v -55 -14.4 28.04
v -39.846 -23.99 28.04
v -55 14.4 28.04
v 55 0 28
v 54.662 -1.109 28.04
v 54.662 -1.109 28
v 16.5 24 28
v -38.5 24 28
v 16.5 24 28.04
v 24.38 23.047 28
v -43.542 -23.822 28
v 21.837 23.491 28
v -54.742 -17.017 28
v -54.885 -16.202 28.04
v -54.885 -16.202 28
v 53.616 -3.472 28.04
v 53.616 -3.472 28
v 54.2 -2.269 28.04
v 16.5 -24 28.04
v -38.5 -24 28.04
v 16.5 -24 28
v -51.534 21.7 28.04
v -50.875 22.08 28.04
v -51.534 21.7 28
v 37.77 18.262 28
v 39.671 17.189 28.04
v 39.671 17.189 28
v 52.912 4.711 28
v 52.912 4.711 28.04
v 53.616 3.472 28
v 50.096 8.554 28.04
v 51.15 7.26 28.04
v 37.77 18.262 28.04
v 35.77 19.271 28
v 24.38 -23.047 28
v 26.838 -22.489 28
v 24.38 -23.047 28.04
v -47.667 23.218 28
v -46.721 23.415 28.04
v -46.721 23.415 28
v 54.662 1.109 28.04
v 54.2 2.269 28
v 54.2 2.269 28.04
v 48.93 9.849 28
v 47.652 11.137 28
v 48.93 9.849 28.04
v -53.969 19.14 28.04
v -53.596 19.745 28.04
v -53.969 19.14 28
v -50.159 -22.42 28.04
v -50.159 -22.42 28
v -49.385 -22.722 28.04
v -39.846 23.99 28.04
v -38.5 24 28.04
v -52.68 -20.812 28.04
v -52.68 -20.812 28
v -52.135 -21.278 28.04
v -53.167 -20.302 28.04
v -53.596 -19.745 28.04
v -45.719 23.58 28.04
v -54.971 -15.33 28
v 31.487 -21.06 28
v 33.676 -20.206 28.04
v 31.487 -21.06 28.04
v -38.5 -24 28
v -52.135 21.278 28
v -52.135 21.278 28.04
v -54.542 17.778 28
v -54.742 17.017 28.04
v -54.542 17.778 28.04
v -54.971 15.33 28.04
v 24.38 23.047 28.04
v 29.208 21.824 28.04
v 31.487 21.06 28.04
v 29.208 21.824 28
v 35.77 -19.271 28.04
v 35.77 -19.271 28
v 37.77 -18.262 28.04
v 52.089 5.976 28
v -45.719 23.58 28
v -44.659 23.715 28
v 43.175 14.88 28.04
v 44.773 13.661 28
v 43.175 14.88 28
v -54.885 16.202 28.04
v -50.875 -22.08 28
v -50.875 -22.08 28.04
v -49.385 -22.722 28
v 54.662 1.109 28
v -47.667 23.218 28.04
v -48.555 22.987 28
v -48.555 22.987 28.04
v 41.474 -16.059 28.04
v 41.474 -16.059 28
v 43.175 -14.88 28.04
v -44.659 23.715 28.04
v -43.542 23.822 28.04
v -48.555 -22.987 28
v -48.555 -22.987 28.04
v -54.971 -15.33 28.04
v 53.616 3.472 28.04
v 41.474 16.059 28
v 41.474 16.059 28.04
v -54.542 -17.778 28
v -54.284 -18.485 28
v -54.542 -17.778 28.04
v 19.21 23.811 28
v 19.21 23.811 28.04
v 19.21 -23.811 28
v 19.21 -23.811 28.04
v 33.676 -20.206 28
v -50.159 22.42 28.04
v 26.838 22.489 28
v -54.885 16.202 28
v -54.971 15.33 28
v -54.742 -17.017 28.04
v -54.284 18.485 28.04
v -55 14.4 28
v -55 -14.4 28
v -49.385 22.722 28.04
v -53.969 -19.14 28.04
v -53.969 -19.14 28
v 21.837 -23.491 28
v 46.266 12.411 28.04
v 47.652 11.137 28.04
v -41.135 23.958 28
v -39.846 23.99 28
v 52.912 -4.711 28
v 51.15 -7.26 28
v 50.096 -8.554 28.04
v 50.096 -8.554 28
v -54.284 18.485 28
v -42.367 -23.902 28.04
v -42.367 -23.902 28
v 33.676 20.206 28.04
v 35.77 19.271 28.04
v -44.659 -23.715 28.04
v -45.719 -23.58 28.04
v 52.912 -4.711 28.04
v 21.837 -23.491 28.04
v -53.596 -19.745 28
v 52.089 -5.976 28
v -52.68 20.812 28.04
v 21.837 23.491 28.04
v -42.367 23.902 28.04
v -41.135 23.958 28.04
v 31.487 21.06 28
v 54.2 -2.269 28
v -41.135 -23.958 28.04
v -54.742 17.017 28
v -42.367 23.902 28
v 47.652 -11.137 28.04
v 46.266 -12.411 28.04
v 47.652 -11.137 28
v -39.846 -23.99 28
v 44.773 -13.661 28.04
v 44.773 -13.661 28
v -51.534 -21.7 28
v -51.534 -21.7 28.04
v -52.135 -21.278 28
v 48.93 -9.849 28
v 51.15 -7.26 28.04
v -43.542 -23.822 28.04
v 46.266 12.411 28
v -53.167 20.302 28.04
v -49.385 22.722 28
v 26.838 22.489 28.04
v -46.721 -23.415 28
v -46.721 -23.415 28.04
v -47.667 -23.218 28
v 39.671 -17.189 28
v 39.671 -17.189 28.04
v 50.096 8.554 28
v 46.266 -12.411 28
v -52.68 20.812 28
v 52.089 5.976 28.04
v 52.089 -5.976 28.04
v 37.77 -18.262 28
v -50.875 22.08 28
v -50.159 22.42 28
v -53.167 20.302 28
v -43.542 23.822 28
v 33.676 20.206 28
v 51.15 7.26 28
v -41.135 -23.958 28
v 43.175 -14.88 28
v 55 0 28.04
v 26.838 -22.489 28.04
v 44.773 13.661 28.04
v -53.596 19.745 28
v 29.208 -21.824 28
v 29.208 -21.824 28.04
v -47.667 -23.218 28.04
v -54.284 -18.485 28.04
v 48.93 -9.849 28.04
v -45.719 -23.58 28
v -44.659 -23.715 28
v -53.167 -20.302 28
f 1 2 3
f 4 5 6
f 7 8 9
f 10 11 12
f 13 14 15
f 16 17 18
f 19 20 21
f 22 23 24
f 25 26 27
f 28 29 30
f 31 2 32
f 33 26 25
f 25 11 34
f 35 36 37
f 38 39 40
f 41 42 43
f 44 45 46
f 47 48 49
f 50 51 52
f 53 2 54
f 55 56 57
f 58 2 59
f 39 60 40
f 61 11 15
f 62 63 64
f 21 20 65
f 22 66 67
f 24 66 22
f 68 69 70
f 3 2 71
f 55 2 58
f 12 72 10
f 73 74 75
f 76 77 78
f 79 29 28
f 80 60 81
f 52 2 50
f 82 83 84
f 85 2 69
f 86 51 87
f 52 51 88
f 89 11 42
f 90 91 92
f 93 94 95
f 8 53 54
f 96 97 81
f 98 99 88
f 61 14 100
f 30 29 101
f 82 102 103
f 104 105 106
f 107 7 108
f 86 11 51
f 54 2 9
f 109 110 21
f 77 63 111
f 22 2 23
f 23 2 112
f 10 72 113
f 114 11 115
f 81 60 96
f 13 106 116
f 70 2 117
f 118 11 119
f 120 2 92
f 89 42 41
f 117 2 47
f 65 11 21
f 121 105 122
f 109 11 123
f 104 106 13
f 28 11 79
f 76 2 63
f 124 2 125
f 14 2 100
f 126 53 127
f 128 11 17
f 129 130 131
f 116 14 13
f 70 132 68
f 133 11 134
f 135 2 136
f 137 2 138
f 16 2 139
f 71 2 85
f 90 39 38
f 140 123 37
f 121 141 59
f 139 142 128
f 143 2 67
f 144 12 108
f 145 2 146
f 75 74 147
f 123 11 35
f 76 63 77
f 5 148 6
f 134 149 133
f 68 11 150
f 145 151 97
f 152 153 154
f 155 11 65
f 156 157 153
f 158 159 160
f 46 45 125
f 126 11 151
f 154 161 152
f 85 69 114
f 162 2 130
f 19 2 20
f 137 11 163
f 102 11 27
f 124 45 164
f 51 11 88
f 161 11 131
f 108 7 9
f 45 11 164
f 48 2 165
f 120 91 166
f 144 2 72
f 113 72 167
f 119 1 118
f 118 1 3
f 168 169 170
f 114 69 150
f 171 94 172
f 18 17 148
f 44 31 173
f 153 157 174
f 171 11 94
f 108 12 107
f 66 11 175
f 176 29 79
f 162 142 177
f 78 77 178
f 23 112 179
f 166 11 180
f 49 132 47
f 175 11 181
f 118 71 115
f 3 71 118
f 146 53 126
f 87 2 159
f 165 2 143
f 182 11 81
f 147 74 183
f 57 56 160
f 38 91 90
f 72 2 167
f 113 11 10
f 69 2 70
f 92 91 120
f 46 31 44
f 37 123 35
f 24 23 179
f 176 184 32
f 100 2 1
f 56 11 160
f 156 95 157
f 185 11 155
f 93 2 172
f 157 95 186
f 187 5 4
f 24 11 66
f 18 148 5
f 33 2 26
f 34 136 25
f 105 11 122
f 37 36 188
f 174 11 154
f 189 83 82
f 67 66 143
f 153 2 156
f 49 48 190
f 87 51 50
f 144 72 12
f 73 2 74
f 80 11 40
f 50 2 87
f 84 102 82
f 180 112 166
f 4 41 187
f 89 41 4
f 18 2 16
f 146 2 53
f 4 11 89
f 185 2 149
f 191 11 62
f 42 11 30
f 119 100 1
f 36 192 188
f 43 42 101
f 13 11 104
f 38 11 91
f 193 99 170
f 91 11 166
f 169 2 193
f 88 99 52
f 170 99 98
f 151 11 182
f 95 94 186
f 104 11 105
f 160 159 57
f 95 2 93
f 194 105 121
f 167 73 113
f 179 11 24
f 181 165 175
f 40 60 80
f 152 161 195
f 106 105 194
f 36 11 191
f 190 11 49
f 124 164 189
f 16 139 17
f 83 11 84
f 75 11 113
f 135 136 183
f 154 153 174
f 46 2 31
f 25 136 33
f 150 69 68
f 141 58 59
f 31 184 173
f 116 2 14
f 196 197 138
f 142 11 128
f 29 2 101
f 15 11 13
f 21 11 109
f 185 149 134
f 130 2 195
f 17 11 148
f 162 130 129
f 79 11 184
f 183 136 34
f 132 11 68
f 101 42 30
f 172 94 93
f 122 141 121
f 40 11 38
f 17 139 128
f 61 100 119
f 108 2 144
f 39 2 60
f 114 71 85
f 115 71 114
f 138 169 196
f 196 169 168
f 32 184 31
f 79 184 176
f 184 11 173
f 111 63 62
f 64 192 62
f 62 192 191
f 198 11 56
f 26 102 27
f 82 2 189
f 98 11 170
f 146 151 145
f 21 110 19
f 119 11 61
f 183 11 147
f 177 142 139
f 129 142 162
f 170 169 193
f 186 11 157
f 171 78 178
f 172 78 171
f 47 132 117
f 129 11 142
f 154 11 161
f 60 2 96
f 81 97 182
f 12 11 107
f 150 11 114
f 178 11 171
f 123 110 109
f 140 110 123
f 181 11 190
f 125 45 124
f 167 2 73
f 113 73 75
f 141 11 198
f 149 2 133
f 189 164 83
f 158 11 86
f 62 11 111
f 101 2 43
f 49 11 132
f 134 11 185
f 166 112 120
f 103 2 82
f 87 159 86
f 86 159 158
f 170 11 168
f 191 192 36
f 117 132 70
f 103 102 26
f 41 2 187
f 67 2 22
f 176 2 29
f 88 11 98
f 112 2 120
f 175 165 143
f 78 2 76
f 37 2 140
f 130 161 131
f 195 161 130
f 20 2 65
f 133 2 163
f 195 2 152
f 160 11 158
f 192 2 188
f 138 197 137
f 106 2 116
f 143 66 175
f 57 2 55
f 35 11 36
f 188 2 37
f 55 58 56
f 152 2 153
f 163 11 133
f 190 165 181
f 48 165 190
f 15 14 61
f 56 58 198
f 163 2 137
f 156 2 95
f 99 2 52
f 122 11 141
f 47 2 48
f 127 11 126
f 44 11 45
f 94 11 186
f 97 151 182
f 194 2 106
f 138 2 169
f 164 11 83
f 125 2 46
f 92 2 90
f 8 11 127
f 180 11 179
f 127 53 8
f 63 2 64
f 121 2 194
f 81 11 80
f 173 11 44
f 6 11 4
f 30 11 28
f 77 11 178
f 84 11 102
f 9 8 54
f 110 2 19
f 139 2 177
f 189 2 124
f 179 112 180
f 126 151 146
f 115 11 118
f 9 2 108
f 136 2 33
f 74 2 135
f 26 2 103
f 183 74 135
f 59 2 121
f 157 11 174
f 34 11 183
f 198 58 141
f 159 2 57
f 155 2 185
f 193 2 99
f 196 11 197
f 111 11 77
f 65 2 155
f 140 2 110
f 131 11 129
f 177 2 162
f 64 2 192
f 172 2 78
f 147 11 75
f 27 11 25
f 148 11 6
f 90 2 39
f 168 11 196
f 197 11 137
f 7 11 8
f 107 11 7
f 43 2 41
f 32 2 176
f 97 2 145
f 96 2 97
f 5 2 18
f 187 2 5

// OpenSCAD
hull() {
  translate([0, 0, 28]) {
    linear_extrude(height = 2.0e-2) {
      polygon(points = [[-55, -14.4], [-54.971354167, -15.330277778], [-54.885416667, -16.202222222], [-54.7421875, -17.0175], [-54.541666667, -17.777777778], [-54.283854167, -18.484722222], [-53.96875, -19.14], [-53.596354167, -19.745277778], [-53.166666667, -20.302222222], [-52.6796875, -20.8125], [-52.135416667, -21.277777778], [-51.533854167, -21.699722222], [-50.875, -22.08], [-50.158854167, -22.420277778], [-49.385416667, -22.722222222], [-48.5546875, -22.9875], [-47.666666667, -23.217777778], [-46.721354167, -23.414722222], [-45.71875, -23.58], [-44.658854167, -23.715277778], [-43.541666667, -23.822222222], [-42.3671875, -23.9025], [-41.135416667, -23.957777778], [-39.846354167, -23.989722222], [-38.5, -24], [-36.409649884, -24], [-34.266782407, -24], [-32.076171875, -24], [-29.842592593, -24], [-27.570818866, -24], [-25.265625, -24], [-22.931785301, -24], [-20.574074074, -24], [-18.197265625, -24], [-15.806134259, -24], [-13.405454282, -24], [-11, -24], [-8.594545718, -24], [-6.193865741, -24], [-3.802734375, -24], [-1.425925926, -24], [0.931785301, -24], [3.265625, -24], [5.570818866, -24], [7.842592593, -24], [10.076171875, -24], [12.266782407, -24], [14.409649884, -24], [16.5, -24], [19.209577546, -23.811388889], [21.837037037, -23.491111111], [24.38046875, -23.0475], [26.837962963, -22.488888889], [29.207609954, -21.823611111], [31.4875, -21.06], [33.67572338, -20.206388889], [35.77037037, -19.271111111], [37.76953125, -18.2625], [39.671296296, -17.188888889], [41.473755787, -16.058611111], [43.175, -14.88], [44.773119213, -13.661388889], [46.266203704, -12.411111111], [47.65234375, -11.1375], [48.92962963, -9.848888889], [50.09615162, -8.553611111], [51.15, -7.26], [52.089265046, -5.976388889], [52.912037037, -4.711111111], [53.61640625, -3.4725], [54.200462963, -2.268888889], [54.662297454, -1.108611111], [55, 0], [54.662297454, 1.108611111], [54.200462963, 2.268888889], [53.61640625, 3.4725], [52.912037037, 4.711111111], [52.089265046, 5.976388889], [51.15, 7.26], [50.09615162, 8.553611111], [48.92962963, 9.848888889], [47.65234375, 11.1375], [46.266203704, 12.411111111], [44.773119213, 13.661388889], [43.175, 14.88], [41.473755787, 16.058611111], [39.671296296, 17.188888889], [37.76953125, 18.2625], [35.77037037, 19.271111111], [33.67572338, 20.206388889], [31.4875, 21.06], [29.207609954, 21.823611111], [26.837962963, 22.488888889], [24.38046875, 23.0475], [21.837037037, 23.491111111], [19.209577546, 23.811388889], [16.5, 24], [14.409649884, 24], [12.266782407, 24], [10.076171875, 24], [7.842592593, 24], [5.570818866, 24], [3.265625, 24], [0.931785301, 24], [-1.425925926, 24], [-3.802734375, 24], [-6.193865741, 24], [-8.594545718, 24], [-11, 24], [-13.405454282, 24], [-15.806134259, 24], [-18.197265625, 24], [-20.574074074, 24], [-22.931785301, 24], [-25.265625, 24], [-27.570818866, 24], [-29.842592593, 24], [-32.076171875, 24], [-34.266782407, 24], [-36.409649884, 24], [-38.5, 24], [-39.846354167, 23.989722222], [-41.135416667, 23.957777778], [-42.3671875, 23.9025], [-43.541666667, 23.822222222], [-44.658854167, 23.715277778], [-45.71875, 23.58], [-46.721354167, 23.414722222], [-47.666666667, 23.217777778], [-48.5546875, 22.9875], [-49.385416667, 22.722222222], [-50.158854167, 22.420277778], [-50.875, 22.08], [-51.533854167, 21.699722222], [-52.135416667, 21.277777778], [-52.6796875, 20.8125], [-53.166666667, 20.302222222], [-53.596354167, 19.745277778], [-53.96875, 19.14], [-54.283854167, 18.484722222], [-54.541666667, 17.777777778], [-54.7421875, 17.0175], [-54.885416667, 16.202222222], [-54.971354167, 15.330277778], [-55, 14.4], [-55, 13.2], [-55, 12], [-55, 10.8], [-55, 9.6], [-55, 8.4], [-55, 7.2], [-55, 6], [-55, 4.8], [-55, 3.6], [-55, 2.4], [-55, 1.2], [-55, 0], [-55, -1.2], [-55, -2.4], [-55, -3.6], [-55, -4.8], [-55, -6], [-55, -7.2], [-55, -8.4], [-55, -9.6], [-55, -10.8], [-55, -12], [-55, -13.2], [-55, -14.4]]);
    }
  }
  translate([0, 0, 28.02]) {
    linear_extrude(height = 2.0e-2) {
      polygon(points = [[-55, -14.4], [-54.971354167, -15.330277778], [-54.885416667, -16.202222222], [-54.7421875, -17.0175], [-54.541666667, -17.777777778], [-54.283854167, -18.484722222], [-53.96875, -19.14], [-53.596354167, -19.745277778], [-53.166666667, -20.302222222], [-52.6796875, -20.8125], [-52.135416667, -21.277777778], [-51.533854167, -21.699722222], [-50.875, -22.08], [-50.158854167, -22.420277778], [-49.385416667, -22.722222222], [-48.5546875, -22.9875], [-47.666666667, -23.217777778], [-46.721354167, -23.414722222], [-45.71875, -23.58], [-44.658854167, -23.715277778], [-43.541666667, -23.822222222], [-42.3671875, -23.9025], [-41.135416667, -23.957777778], [-39.846354167, -23.989722222], [-38.5, -24], [-36.409649884, -24], [-34.266782407, -24], [-32.076171875, -24], [-29.842592593, -24], [-27.570818866, -24], [-25.265625, -24], [-22.931785301, -24], [-20.574074074, -24], [-18.197265625, -24], [-15.806134259, -24], [-13.405454282, -24], [-11, -24], [-8.594545718, -24], [-6.193865741, -24], [-3.802734375, -24], [-1.425925926, -24], [0.931785301, -24], [3.265625, -24], [5.570818866, -24], [7.842592593, -24], [10.076171875, -24], [12.266782407, -24], [14.409649884, -24], [16.5, -24], [19.209577546, -23.811388889], [21.837037037, -23.491111111], [24.38046875, -23.0475], [26.837962963, -22.488888889], [29.207609954, -21.823611111], [31.4875, -21.06], [33.67572338, -20.206388889], [35.77037037, -19.271111111], [37.76953125, -18.2625], [39.671296296, -17.188888889], [41.473755787, -16.058611111], [43.175, -14.88], [44.773119213, -13.661388889], [46.266203704, -12.411111111], [47.65234375, -11.1375], [48.92962963, -9.848888889], [50.09615162, -8.553611111], [51.15, -7.26], [52.089265046, -5.976388889], [52.912037037, -4.711111111], [53.61640625, -3.4725], [54.200462963, -2.268888889], [54.662297454, -1.108611111], [55, 0], [54.662297454, 1.108611111], [54.200462963, 2.268888889], [53.61640625, 3.4725], [52.912037037, 4.711111111], [52.089265046, 5.976388889], [51.15, 7.26], [50.09615162, 8.553611111], [48.92962963, 9.848888889], [47.65234375, 11.1375], [46.266203704, 12.411111111], [44.773119213, 13.661388889], [43.175, 14.88], [41.473755787, 16.058611111], [39.671296296, 17.188888889], [37.76953125, 18.2625], [35.77037037, 19.271111111], [33.67572338, 20.206388889], [31.4875, 21.06], [29.207609954, 21.823611111], [26.837962963, 22.488888889], [24.38046875, 23.0475], [21.837037037, 23.491111111], [19.209577546, 23.811388889], [16.5, 24], [14.409649884, 24], [12.266782407, 24], [10.076171875, 24], [7.842592593, 24], [5.570818866, 24], [3.265625, 24], [0.931785301, 24], [-1.425925926, 24], [-3.802734375, 24], [-6.193865741, 24], [-8.594545718, 24], [-11, 24], [-13.405454282, 24], [-15.806134259, 24], [-18.197265625, 24], [-20.574074074, 24], [-22.931785301, 24], [-25.265625, 24], [-27.570818866, 24], [-29.842592593, 24], [-32.076171875, 24], [-34.266782407, 24], [-36.409649884, 24], [-38.5, 24], [-39.846354167, 23.989722222], [-41.135416667, 23.957777778], [-42.3671875, 23.9025], [-43.541666667, 23.822222222], [-44.658854167, 23.715277778], [-45.71875, 23.58], [-46.721354167, 23.414722222], [-47.666666667, 23.217777778], [-48.5546875, 22.9875], [-49.385416667, 22.722222222], [-50.158854167, 22.420277778], [-50.875, 22.08], [-51.533854167, 21.699722222], [-52.135416667, 21.277777778], [-52.6796875, 20.8125], [-53.166666667, 20.302222222], [-53.596354167, 19.745277778], [-53.96875, 19.14], [-54.283854167, 18.484722222], [-54.541666667, 17.777777778], [-54.7421875, 17.0175], [-54.885416667, 16.202222222], [-54.971354167, 15.330277778], [-55, 14.4], [-55, 13.2], [-55, 12], [-55, 10.8], [-55, 9.6], [-55, 8.4], [-55, 7.2], [-55, 6], [-55, 4.8], [-55, 3.6], [-55, 2.4], [-55, 1.2], [-55, 0], [-55, -1.2], [-55, -2.4], [-55, -3.6], [-55, -4.8], [-55, -6], [-55, -7.2], [-55, -8.4], [-55, -9.6], [-55, -10.8], [-55, -12], [-55, -13.2], [-55, -14.4]]);
    }
  }
}
$fn = 50;
